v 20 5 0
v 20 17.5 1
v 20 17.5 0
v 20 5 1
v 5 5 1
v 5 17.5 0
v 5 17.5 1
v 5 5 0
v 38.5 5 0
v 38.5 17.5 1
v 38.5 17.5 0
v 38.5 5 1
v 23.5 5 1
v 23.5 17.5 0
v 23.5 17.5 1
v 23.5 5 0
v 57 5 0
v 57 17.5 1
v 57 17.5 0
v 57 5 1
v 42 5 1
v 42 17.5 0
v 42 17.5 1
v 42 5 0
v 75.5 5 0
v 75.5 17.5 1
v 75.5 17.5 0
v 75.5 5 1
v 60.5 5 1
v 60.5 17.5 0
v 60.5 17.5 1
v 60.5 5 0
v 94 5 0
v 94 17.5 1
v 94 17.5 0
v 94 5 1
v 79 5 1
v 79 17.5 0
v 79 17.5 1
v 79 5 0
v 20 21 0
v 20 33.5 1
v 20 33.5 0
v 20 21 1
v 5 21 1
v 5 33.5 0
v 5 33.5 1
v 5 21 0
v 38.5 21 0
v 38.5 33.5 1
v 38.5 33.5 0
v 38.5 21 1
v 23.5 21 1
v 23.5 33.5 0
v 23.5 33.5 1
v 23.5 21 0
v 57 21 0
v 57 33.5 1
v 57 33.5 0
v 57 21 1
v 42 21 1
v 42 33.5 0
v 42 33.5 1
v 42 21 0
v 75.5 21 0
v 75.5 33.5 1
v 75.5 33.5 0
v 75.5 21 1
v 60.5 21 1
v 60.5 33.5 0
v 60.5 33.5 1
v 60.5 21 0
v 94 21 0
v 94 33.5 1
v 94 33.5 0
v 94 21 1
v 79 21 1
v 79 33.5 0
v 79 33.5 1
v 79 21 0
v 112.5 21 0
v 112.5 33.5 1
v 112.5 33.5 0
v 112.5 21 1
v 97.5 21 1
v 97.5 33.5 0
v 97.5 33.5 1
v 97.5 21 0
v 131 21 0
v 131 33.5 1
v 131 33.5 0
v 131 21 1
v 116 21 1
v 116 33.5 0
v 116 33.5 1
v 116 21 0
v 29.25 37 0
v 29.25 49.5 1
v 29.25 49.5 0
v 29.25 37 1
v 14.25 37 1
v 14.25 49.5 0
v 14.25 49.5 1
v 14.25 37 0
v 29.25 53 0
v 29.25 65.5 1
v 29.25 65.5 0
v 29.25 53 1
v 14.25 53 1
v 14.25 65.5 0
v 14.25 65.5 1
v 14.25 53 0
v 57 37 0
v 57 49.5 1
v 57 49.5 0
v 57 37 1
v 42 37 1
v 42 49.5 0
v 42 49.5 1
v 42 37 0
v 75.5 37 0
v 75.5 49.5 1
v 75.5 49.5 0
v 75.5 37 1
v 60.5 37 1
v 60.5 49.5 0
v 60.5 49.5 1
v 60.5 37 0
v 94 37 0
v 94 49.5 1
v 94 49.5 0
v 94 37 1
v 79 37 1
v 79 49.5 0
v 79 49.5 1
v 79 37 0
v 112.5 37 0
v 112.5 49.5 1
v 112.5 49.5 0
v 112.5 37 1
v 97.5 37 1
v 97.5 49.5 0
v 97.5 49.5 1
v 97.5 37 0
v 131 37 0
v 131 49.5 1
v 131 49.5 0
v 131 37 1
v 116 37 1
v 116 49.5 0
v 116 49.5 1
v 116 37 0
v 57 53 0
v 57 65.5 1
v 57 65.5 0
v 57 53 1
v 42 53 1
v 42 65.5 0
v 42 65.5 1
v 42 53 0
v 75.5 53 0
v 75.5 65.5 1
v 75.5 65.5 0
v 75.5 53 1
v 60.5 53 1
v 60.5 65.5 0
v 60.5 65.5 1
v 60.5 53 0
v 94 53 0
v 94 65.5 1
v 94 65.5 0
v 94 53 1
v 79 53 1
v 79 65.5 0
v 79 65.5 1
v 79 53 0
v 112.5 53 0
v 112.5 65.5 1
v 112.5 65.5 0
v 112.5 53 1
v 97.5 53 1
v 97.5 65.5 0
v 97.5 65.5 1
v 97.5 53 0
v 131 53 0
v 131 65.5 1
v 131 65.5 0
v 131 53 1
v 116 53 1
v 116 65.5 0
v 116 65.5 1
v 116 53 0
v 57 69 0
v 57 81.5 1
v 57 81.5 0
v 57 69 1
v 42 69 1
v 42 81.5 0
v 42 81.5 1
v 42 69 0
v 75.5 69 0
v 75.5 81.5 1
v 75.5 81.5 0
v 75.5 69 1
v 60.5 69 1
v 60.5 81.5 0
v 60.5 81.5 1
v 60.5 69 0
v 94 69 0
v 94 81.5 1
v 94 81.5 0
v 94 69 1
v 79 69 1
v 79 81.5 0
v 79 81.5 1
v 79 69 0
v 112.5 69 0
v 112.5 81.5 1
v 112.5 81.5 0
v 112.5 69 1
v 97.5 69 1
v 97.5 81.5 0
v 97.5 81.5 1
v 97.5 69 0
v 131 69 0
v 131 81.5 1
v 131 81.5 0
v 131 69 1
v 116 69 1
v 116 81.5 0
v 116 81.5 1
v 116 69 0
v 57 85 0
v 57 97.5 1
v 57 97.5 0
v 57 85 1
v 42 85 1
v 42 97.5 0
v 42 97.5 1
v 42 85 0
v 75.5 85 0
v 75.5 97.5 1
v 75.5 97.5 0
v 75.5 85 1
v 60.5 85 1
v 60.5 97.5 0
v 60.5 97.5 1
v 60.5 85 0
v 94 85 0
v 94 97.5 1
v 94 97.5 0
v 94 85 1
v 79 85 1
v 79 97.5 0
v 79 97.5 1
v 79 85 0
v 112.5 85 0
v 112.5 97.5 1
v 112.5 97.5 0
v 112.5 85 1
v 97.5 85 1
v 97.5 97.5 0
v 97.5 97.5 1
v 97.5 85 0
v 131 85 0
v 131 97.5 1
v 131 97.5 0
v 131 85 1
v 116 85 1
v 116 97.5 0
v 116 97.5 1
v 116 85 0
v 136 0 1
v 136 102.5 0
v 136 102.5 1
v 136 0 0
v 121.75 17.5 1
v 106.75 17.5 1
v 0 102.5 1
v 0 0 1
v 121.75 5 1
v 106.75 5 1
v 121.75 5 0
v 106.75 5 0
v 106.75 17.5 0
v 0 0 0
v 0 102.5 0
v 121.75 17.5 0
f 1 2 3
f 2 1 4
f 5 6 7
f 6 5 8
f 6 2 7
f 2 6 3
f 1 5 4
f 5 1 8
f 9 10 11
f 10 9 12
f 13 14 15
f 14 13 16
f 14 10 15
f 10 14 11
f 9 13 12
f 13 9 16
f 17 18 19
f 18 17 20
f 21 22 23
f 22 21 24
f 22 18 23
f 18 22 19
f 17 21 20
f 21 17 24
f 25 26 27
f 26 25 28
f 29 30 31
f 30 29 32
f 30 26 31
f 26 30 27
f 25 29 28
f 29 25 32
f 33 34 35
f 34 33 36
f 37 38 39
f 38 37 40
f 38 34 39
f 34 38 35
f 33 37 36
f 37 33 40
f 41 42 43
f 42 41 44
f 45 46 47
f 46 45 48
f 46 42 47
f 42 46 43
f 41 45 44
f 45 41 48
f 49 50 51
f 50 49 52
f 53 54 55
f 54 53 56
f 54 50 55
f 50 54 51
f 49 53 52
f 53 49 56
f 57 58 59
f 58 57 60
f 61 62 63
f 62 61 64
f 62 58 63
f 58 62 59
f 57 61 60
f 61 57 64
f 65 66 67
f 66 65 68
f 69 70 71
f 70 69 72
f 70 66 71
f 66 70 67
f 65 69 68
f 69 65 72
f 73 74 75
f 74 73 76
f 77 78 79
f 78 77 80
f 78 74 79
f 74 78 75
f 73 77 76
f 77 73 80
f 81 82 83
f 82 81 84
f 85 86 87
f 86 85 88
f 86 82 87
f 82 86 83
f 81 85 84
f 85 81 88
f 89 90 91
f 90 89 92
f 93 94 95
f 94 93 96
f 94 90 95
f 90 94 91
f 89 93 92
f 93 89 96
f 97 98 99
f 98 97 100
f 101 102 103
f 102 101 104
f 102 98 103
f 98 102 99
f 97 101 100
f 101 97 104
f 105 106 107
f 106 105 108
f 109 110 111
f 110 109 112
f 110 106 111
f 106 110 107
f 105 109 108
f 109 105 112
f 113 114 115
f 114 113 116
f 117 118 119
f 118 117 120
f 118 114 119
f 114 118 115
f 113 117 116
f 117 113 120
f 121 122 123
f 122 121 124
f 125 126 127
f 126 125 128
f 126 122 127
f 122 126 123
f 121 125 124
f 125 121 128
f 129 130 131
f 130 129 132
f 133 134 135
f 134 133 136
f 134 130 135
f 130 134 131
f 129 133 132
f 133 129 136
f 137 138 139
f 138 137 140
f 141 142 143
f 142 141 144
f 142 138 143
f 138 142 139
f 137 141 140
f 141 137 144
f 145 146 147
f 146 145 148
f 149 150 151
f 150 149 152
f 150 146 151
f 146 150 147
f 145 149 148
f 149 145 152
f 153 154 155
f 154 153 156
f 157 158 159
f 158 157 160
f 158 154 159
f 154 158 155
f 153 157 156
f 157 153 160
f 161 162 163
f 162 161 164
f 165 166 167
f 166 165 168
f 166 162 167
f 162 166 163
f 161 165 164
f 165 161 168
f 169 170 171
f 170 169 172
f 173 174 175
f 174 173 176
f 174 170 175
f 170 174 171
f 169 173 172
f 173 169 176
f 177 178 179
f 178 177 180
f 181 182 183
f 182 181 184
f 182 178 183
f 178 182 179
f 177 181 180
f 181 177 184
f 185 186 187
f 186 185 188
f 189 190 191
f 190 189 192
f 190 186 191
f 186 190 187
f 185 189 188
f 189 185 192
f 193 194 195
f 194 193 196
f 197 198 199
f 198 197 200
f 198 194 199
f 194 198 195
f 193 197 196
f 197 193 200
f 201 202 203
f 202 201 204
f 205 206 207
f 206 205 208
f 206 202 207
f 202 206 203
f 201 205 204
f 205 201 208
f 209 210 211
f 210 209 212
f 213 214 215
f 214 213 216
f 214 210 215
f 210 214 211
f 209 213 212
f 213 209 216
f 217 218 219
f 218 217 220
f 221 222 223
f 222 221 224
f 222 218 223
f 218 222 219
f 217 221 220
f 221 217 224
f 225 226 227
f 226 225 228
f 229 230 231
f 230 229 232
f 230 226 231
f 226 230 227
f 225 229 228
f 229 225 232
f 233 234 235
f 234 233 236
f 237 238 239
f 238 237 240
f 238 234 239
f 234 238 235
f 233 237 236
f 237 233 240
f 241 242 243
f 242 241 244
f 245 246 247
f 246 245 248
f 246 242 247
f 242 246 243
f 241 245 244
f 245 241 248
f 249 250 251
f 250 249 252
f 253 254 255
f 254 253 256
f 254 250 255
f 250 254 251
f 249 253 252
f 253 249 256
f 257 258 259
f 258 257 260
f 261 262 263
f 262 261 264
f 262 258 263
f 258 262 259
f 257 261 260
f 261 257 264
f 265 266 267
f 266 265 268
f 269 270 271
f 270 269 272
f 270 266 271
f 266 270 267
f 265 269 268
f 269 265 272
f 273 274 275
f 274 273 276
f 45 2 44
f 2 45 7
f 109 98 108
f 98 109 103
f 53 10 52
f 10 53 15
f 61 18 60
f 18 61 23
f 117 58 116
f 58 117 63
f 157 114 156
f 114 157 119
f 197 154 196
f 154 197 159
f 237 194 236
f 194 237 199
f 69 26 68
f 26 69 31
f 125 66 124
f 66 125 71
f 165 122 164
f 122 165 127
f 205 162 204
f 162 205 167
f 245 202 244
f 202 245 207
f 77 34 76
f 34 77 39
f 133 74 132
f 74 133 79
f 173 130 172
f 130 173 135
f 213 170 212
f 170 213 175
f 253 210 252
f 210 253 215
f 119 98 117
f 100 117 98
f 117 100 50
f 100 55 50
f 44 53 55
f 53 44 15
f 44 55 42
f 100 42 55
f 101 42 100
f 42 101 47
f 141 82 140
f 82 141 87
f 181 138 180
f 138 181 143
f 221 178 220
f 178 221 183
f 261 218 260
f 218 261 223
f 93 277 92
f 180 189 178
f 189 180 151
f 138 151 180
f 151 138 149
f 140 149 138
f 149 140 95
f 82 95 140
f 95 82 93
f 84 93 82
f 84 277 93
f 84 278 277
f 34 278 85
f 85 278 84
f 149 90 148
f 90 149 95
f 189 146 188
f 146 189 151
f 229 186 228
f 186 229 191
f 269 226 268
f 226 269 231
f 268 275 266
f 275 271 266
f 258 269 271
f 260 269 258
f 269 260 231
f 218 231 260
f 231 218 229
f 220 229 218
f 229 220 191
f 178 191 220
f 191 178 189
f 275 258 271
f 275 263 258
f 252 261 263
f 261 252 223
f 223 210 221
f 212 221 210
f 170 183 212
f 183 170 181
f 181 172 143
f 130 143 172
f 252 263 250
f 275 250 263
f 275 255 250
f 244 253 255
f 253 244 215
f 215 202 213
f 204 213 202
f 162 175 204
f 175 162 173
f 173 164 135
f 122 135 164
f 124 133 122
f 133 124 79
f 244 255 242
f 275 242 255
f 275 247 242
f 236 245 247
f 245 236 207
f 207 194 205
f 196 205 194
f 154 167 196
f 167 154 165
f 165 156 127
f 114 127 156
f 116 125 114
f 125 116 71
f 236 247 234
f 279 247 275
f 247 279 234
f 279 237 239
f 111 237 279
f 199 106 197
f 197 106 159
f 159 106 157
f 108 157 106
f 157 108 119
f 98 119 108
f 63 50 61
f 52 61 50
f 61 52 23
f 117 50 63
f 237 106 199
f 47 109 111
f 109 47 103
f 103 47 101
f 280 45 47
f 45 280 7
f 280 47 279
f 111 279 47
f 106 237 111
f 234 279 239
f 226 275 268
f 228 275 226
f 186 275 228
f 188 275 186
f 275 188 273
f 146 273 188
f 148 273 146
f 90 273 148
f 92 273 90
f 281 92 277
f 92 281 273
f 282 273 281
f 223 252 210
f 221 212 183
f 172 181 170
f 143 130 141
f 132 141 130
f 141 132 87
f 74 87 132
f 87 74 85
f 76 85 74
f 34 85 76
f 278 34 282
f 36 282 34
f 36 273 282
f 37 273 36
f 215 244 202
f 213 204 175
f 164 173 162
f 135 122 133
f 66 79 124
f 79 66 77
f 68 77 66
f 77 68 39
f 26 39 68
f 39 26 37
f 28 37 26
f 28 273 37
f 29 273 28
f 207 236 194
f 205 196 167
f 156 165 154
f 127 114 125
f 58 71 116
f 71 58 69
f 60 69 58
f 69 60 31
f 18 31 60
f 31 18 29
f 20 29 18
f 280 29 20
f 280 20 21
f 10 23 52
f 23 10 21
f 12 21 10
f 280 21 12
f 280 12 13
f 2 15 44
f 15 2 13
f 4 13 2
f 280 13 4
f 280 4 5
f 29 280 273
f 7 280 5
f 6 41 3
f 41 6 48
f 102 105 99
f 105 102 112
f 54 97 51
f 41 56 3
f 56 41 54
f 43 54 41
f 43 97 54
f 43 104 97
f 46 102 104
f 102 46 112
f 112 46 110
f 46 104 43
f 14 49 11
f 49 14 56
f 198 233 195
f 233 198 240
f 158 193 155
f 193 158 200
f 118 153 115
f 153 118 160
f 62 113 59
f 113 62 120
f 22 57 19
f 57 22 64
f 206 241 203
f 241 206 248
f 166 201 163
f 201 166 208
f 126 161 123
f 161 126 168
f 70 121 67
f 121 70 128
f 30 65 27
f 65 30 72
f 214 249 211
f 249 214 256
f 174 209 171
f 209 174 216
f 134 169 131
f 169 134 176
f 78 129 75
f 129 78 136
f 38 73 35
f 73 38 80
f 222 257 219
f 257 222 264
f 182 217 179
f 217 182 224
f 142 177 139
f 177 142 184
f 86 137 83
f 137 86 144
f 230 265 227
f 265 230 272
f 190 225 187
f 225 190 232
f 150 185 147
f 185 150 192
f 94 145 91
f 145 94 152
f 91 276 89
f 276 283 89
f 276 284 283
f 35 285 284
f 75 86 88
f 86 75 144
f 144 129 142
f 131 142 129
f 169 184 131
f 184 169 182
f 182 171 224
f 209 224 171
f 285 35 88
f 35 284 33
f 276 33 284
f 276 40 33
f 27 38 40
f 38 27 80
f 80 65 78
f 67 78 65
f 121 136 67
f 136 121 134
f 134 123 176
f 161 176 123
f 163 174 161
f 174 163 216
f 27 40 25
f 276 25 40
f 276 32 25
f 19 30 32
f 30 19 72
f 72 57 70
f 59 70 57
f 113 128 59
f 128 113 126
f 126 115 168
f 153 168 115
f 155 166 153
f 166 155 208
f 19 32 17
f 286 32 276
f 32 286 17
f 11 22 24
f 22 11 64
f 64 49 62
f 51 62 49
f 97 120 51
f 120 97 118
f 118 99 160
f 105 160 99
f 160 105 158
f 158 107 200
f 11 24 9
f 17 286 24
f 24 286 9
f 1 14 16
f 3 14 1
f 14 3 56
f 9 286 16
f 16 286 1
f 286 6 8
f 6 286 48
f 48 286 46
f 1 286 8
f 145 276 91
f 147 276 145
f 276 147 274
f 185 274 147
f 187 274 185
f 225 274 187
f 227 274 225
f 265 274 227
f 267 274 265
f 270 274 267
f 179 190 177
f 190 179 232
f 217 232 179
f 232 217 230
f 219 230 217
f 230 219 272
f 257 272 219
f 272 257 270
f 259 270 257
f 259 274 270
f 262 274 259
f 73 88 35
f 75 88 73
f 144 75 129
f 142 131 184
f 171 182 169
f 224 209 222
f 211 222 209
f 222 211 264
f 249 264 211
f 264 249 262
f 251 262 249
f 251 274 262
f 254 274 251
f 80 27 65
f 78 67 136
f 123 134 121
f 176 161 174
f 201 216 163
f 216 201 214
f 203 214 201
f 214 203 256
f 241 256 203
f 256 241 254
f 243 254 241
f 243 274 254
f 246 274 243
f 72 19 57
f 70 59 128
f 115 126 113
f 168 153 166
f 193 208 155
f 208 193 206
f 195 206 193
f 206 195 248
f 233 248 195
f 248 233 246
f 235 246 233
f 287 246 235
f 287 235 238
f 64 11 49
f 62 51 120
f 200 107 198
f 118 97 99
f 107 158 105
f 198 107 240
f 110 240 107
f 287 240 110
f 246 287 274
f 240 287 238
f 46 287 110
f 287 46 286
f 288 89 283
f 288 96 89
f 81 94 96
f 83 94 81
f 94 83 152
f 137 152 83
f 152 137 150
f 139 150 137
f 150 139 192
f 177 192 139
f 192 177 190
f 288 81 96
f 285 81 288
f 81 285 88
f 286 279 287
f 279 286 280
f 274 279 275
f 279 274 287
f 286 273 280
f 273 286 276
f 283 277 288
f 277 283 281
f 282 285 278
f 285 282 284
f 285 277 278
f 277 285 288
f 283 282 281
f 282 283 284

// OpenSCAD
/* ModuleA
 * All keyholes made. Should be valid for creation.
 */

keyCols = 7;
keyRows = 6;
keyX = 15;
keyY = 12.5;
keySpace = 3.5;
edgeSpace = 5-keySpace;
keyZ = -1;

moduleX = (edgeSpace+5)+(keySpace*keyCols)+keyX*(keyCols-1)+keyX;
moduleY = (edgeSpace+5)+(keySpace*keyRows)+keyY*(keyRows-1)+keyY;
moduleZ = 1;

keySize = [keyX, keyY, moduleZ+2];

function position(x,y,z) = [edgeSpace+keySpace*x+keyX*(x-1), edgeSpace+keySpace*y+keyY*(y-1), z];

module keyHoles (yStart, yEnd, xStart, xEnd){
    for(y = [yStart:yEnd]){
        for(x = [xStart:xEnd]){
			translate(position(x,y,keyZ)) cube(keySize);
        }
    }
}

difference(){
    cube([moduleX,moduleY,moduleZ]);

	keyHoles(1,1,1,5);
	keyHoles(1,1,6.5,6.5);

	keyHoles(2,2,1,7);

	keyHoles(3,4,1.5,1.5);
	keyHoles(3,4,3,7);

	keyHoles(5,6,3,7);
}
